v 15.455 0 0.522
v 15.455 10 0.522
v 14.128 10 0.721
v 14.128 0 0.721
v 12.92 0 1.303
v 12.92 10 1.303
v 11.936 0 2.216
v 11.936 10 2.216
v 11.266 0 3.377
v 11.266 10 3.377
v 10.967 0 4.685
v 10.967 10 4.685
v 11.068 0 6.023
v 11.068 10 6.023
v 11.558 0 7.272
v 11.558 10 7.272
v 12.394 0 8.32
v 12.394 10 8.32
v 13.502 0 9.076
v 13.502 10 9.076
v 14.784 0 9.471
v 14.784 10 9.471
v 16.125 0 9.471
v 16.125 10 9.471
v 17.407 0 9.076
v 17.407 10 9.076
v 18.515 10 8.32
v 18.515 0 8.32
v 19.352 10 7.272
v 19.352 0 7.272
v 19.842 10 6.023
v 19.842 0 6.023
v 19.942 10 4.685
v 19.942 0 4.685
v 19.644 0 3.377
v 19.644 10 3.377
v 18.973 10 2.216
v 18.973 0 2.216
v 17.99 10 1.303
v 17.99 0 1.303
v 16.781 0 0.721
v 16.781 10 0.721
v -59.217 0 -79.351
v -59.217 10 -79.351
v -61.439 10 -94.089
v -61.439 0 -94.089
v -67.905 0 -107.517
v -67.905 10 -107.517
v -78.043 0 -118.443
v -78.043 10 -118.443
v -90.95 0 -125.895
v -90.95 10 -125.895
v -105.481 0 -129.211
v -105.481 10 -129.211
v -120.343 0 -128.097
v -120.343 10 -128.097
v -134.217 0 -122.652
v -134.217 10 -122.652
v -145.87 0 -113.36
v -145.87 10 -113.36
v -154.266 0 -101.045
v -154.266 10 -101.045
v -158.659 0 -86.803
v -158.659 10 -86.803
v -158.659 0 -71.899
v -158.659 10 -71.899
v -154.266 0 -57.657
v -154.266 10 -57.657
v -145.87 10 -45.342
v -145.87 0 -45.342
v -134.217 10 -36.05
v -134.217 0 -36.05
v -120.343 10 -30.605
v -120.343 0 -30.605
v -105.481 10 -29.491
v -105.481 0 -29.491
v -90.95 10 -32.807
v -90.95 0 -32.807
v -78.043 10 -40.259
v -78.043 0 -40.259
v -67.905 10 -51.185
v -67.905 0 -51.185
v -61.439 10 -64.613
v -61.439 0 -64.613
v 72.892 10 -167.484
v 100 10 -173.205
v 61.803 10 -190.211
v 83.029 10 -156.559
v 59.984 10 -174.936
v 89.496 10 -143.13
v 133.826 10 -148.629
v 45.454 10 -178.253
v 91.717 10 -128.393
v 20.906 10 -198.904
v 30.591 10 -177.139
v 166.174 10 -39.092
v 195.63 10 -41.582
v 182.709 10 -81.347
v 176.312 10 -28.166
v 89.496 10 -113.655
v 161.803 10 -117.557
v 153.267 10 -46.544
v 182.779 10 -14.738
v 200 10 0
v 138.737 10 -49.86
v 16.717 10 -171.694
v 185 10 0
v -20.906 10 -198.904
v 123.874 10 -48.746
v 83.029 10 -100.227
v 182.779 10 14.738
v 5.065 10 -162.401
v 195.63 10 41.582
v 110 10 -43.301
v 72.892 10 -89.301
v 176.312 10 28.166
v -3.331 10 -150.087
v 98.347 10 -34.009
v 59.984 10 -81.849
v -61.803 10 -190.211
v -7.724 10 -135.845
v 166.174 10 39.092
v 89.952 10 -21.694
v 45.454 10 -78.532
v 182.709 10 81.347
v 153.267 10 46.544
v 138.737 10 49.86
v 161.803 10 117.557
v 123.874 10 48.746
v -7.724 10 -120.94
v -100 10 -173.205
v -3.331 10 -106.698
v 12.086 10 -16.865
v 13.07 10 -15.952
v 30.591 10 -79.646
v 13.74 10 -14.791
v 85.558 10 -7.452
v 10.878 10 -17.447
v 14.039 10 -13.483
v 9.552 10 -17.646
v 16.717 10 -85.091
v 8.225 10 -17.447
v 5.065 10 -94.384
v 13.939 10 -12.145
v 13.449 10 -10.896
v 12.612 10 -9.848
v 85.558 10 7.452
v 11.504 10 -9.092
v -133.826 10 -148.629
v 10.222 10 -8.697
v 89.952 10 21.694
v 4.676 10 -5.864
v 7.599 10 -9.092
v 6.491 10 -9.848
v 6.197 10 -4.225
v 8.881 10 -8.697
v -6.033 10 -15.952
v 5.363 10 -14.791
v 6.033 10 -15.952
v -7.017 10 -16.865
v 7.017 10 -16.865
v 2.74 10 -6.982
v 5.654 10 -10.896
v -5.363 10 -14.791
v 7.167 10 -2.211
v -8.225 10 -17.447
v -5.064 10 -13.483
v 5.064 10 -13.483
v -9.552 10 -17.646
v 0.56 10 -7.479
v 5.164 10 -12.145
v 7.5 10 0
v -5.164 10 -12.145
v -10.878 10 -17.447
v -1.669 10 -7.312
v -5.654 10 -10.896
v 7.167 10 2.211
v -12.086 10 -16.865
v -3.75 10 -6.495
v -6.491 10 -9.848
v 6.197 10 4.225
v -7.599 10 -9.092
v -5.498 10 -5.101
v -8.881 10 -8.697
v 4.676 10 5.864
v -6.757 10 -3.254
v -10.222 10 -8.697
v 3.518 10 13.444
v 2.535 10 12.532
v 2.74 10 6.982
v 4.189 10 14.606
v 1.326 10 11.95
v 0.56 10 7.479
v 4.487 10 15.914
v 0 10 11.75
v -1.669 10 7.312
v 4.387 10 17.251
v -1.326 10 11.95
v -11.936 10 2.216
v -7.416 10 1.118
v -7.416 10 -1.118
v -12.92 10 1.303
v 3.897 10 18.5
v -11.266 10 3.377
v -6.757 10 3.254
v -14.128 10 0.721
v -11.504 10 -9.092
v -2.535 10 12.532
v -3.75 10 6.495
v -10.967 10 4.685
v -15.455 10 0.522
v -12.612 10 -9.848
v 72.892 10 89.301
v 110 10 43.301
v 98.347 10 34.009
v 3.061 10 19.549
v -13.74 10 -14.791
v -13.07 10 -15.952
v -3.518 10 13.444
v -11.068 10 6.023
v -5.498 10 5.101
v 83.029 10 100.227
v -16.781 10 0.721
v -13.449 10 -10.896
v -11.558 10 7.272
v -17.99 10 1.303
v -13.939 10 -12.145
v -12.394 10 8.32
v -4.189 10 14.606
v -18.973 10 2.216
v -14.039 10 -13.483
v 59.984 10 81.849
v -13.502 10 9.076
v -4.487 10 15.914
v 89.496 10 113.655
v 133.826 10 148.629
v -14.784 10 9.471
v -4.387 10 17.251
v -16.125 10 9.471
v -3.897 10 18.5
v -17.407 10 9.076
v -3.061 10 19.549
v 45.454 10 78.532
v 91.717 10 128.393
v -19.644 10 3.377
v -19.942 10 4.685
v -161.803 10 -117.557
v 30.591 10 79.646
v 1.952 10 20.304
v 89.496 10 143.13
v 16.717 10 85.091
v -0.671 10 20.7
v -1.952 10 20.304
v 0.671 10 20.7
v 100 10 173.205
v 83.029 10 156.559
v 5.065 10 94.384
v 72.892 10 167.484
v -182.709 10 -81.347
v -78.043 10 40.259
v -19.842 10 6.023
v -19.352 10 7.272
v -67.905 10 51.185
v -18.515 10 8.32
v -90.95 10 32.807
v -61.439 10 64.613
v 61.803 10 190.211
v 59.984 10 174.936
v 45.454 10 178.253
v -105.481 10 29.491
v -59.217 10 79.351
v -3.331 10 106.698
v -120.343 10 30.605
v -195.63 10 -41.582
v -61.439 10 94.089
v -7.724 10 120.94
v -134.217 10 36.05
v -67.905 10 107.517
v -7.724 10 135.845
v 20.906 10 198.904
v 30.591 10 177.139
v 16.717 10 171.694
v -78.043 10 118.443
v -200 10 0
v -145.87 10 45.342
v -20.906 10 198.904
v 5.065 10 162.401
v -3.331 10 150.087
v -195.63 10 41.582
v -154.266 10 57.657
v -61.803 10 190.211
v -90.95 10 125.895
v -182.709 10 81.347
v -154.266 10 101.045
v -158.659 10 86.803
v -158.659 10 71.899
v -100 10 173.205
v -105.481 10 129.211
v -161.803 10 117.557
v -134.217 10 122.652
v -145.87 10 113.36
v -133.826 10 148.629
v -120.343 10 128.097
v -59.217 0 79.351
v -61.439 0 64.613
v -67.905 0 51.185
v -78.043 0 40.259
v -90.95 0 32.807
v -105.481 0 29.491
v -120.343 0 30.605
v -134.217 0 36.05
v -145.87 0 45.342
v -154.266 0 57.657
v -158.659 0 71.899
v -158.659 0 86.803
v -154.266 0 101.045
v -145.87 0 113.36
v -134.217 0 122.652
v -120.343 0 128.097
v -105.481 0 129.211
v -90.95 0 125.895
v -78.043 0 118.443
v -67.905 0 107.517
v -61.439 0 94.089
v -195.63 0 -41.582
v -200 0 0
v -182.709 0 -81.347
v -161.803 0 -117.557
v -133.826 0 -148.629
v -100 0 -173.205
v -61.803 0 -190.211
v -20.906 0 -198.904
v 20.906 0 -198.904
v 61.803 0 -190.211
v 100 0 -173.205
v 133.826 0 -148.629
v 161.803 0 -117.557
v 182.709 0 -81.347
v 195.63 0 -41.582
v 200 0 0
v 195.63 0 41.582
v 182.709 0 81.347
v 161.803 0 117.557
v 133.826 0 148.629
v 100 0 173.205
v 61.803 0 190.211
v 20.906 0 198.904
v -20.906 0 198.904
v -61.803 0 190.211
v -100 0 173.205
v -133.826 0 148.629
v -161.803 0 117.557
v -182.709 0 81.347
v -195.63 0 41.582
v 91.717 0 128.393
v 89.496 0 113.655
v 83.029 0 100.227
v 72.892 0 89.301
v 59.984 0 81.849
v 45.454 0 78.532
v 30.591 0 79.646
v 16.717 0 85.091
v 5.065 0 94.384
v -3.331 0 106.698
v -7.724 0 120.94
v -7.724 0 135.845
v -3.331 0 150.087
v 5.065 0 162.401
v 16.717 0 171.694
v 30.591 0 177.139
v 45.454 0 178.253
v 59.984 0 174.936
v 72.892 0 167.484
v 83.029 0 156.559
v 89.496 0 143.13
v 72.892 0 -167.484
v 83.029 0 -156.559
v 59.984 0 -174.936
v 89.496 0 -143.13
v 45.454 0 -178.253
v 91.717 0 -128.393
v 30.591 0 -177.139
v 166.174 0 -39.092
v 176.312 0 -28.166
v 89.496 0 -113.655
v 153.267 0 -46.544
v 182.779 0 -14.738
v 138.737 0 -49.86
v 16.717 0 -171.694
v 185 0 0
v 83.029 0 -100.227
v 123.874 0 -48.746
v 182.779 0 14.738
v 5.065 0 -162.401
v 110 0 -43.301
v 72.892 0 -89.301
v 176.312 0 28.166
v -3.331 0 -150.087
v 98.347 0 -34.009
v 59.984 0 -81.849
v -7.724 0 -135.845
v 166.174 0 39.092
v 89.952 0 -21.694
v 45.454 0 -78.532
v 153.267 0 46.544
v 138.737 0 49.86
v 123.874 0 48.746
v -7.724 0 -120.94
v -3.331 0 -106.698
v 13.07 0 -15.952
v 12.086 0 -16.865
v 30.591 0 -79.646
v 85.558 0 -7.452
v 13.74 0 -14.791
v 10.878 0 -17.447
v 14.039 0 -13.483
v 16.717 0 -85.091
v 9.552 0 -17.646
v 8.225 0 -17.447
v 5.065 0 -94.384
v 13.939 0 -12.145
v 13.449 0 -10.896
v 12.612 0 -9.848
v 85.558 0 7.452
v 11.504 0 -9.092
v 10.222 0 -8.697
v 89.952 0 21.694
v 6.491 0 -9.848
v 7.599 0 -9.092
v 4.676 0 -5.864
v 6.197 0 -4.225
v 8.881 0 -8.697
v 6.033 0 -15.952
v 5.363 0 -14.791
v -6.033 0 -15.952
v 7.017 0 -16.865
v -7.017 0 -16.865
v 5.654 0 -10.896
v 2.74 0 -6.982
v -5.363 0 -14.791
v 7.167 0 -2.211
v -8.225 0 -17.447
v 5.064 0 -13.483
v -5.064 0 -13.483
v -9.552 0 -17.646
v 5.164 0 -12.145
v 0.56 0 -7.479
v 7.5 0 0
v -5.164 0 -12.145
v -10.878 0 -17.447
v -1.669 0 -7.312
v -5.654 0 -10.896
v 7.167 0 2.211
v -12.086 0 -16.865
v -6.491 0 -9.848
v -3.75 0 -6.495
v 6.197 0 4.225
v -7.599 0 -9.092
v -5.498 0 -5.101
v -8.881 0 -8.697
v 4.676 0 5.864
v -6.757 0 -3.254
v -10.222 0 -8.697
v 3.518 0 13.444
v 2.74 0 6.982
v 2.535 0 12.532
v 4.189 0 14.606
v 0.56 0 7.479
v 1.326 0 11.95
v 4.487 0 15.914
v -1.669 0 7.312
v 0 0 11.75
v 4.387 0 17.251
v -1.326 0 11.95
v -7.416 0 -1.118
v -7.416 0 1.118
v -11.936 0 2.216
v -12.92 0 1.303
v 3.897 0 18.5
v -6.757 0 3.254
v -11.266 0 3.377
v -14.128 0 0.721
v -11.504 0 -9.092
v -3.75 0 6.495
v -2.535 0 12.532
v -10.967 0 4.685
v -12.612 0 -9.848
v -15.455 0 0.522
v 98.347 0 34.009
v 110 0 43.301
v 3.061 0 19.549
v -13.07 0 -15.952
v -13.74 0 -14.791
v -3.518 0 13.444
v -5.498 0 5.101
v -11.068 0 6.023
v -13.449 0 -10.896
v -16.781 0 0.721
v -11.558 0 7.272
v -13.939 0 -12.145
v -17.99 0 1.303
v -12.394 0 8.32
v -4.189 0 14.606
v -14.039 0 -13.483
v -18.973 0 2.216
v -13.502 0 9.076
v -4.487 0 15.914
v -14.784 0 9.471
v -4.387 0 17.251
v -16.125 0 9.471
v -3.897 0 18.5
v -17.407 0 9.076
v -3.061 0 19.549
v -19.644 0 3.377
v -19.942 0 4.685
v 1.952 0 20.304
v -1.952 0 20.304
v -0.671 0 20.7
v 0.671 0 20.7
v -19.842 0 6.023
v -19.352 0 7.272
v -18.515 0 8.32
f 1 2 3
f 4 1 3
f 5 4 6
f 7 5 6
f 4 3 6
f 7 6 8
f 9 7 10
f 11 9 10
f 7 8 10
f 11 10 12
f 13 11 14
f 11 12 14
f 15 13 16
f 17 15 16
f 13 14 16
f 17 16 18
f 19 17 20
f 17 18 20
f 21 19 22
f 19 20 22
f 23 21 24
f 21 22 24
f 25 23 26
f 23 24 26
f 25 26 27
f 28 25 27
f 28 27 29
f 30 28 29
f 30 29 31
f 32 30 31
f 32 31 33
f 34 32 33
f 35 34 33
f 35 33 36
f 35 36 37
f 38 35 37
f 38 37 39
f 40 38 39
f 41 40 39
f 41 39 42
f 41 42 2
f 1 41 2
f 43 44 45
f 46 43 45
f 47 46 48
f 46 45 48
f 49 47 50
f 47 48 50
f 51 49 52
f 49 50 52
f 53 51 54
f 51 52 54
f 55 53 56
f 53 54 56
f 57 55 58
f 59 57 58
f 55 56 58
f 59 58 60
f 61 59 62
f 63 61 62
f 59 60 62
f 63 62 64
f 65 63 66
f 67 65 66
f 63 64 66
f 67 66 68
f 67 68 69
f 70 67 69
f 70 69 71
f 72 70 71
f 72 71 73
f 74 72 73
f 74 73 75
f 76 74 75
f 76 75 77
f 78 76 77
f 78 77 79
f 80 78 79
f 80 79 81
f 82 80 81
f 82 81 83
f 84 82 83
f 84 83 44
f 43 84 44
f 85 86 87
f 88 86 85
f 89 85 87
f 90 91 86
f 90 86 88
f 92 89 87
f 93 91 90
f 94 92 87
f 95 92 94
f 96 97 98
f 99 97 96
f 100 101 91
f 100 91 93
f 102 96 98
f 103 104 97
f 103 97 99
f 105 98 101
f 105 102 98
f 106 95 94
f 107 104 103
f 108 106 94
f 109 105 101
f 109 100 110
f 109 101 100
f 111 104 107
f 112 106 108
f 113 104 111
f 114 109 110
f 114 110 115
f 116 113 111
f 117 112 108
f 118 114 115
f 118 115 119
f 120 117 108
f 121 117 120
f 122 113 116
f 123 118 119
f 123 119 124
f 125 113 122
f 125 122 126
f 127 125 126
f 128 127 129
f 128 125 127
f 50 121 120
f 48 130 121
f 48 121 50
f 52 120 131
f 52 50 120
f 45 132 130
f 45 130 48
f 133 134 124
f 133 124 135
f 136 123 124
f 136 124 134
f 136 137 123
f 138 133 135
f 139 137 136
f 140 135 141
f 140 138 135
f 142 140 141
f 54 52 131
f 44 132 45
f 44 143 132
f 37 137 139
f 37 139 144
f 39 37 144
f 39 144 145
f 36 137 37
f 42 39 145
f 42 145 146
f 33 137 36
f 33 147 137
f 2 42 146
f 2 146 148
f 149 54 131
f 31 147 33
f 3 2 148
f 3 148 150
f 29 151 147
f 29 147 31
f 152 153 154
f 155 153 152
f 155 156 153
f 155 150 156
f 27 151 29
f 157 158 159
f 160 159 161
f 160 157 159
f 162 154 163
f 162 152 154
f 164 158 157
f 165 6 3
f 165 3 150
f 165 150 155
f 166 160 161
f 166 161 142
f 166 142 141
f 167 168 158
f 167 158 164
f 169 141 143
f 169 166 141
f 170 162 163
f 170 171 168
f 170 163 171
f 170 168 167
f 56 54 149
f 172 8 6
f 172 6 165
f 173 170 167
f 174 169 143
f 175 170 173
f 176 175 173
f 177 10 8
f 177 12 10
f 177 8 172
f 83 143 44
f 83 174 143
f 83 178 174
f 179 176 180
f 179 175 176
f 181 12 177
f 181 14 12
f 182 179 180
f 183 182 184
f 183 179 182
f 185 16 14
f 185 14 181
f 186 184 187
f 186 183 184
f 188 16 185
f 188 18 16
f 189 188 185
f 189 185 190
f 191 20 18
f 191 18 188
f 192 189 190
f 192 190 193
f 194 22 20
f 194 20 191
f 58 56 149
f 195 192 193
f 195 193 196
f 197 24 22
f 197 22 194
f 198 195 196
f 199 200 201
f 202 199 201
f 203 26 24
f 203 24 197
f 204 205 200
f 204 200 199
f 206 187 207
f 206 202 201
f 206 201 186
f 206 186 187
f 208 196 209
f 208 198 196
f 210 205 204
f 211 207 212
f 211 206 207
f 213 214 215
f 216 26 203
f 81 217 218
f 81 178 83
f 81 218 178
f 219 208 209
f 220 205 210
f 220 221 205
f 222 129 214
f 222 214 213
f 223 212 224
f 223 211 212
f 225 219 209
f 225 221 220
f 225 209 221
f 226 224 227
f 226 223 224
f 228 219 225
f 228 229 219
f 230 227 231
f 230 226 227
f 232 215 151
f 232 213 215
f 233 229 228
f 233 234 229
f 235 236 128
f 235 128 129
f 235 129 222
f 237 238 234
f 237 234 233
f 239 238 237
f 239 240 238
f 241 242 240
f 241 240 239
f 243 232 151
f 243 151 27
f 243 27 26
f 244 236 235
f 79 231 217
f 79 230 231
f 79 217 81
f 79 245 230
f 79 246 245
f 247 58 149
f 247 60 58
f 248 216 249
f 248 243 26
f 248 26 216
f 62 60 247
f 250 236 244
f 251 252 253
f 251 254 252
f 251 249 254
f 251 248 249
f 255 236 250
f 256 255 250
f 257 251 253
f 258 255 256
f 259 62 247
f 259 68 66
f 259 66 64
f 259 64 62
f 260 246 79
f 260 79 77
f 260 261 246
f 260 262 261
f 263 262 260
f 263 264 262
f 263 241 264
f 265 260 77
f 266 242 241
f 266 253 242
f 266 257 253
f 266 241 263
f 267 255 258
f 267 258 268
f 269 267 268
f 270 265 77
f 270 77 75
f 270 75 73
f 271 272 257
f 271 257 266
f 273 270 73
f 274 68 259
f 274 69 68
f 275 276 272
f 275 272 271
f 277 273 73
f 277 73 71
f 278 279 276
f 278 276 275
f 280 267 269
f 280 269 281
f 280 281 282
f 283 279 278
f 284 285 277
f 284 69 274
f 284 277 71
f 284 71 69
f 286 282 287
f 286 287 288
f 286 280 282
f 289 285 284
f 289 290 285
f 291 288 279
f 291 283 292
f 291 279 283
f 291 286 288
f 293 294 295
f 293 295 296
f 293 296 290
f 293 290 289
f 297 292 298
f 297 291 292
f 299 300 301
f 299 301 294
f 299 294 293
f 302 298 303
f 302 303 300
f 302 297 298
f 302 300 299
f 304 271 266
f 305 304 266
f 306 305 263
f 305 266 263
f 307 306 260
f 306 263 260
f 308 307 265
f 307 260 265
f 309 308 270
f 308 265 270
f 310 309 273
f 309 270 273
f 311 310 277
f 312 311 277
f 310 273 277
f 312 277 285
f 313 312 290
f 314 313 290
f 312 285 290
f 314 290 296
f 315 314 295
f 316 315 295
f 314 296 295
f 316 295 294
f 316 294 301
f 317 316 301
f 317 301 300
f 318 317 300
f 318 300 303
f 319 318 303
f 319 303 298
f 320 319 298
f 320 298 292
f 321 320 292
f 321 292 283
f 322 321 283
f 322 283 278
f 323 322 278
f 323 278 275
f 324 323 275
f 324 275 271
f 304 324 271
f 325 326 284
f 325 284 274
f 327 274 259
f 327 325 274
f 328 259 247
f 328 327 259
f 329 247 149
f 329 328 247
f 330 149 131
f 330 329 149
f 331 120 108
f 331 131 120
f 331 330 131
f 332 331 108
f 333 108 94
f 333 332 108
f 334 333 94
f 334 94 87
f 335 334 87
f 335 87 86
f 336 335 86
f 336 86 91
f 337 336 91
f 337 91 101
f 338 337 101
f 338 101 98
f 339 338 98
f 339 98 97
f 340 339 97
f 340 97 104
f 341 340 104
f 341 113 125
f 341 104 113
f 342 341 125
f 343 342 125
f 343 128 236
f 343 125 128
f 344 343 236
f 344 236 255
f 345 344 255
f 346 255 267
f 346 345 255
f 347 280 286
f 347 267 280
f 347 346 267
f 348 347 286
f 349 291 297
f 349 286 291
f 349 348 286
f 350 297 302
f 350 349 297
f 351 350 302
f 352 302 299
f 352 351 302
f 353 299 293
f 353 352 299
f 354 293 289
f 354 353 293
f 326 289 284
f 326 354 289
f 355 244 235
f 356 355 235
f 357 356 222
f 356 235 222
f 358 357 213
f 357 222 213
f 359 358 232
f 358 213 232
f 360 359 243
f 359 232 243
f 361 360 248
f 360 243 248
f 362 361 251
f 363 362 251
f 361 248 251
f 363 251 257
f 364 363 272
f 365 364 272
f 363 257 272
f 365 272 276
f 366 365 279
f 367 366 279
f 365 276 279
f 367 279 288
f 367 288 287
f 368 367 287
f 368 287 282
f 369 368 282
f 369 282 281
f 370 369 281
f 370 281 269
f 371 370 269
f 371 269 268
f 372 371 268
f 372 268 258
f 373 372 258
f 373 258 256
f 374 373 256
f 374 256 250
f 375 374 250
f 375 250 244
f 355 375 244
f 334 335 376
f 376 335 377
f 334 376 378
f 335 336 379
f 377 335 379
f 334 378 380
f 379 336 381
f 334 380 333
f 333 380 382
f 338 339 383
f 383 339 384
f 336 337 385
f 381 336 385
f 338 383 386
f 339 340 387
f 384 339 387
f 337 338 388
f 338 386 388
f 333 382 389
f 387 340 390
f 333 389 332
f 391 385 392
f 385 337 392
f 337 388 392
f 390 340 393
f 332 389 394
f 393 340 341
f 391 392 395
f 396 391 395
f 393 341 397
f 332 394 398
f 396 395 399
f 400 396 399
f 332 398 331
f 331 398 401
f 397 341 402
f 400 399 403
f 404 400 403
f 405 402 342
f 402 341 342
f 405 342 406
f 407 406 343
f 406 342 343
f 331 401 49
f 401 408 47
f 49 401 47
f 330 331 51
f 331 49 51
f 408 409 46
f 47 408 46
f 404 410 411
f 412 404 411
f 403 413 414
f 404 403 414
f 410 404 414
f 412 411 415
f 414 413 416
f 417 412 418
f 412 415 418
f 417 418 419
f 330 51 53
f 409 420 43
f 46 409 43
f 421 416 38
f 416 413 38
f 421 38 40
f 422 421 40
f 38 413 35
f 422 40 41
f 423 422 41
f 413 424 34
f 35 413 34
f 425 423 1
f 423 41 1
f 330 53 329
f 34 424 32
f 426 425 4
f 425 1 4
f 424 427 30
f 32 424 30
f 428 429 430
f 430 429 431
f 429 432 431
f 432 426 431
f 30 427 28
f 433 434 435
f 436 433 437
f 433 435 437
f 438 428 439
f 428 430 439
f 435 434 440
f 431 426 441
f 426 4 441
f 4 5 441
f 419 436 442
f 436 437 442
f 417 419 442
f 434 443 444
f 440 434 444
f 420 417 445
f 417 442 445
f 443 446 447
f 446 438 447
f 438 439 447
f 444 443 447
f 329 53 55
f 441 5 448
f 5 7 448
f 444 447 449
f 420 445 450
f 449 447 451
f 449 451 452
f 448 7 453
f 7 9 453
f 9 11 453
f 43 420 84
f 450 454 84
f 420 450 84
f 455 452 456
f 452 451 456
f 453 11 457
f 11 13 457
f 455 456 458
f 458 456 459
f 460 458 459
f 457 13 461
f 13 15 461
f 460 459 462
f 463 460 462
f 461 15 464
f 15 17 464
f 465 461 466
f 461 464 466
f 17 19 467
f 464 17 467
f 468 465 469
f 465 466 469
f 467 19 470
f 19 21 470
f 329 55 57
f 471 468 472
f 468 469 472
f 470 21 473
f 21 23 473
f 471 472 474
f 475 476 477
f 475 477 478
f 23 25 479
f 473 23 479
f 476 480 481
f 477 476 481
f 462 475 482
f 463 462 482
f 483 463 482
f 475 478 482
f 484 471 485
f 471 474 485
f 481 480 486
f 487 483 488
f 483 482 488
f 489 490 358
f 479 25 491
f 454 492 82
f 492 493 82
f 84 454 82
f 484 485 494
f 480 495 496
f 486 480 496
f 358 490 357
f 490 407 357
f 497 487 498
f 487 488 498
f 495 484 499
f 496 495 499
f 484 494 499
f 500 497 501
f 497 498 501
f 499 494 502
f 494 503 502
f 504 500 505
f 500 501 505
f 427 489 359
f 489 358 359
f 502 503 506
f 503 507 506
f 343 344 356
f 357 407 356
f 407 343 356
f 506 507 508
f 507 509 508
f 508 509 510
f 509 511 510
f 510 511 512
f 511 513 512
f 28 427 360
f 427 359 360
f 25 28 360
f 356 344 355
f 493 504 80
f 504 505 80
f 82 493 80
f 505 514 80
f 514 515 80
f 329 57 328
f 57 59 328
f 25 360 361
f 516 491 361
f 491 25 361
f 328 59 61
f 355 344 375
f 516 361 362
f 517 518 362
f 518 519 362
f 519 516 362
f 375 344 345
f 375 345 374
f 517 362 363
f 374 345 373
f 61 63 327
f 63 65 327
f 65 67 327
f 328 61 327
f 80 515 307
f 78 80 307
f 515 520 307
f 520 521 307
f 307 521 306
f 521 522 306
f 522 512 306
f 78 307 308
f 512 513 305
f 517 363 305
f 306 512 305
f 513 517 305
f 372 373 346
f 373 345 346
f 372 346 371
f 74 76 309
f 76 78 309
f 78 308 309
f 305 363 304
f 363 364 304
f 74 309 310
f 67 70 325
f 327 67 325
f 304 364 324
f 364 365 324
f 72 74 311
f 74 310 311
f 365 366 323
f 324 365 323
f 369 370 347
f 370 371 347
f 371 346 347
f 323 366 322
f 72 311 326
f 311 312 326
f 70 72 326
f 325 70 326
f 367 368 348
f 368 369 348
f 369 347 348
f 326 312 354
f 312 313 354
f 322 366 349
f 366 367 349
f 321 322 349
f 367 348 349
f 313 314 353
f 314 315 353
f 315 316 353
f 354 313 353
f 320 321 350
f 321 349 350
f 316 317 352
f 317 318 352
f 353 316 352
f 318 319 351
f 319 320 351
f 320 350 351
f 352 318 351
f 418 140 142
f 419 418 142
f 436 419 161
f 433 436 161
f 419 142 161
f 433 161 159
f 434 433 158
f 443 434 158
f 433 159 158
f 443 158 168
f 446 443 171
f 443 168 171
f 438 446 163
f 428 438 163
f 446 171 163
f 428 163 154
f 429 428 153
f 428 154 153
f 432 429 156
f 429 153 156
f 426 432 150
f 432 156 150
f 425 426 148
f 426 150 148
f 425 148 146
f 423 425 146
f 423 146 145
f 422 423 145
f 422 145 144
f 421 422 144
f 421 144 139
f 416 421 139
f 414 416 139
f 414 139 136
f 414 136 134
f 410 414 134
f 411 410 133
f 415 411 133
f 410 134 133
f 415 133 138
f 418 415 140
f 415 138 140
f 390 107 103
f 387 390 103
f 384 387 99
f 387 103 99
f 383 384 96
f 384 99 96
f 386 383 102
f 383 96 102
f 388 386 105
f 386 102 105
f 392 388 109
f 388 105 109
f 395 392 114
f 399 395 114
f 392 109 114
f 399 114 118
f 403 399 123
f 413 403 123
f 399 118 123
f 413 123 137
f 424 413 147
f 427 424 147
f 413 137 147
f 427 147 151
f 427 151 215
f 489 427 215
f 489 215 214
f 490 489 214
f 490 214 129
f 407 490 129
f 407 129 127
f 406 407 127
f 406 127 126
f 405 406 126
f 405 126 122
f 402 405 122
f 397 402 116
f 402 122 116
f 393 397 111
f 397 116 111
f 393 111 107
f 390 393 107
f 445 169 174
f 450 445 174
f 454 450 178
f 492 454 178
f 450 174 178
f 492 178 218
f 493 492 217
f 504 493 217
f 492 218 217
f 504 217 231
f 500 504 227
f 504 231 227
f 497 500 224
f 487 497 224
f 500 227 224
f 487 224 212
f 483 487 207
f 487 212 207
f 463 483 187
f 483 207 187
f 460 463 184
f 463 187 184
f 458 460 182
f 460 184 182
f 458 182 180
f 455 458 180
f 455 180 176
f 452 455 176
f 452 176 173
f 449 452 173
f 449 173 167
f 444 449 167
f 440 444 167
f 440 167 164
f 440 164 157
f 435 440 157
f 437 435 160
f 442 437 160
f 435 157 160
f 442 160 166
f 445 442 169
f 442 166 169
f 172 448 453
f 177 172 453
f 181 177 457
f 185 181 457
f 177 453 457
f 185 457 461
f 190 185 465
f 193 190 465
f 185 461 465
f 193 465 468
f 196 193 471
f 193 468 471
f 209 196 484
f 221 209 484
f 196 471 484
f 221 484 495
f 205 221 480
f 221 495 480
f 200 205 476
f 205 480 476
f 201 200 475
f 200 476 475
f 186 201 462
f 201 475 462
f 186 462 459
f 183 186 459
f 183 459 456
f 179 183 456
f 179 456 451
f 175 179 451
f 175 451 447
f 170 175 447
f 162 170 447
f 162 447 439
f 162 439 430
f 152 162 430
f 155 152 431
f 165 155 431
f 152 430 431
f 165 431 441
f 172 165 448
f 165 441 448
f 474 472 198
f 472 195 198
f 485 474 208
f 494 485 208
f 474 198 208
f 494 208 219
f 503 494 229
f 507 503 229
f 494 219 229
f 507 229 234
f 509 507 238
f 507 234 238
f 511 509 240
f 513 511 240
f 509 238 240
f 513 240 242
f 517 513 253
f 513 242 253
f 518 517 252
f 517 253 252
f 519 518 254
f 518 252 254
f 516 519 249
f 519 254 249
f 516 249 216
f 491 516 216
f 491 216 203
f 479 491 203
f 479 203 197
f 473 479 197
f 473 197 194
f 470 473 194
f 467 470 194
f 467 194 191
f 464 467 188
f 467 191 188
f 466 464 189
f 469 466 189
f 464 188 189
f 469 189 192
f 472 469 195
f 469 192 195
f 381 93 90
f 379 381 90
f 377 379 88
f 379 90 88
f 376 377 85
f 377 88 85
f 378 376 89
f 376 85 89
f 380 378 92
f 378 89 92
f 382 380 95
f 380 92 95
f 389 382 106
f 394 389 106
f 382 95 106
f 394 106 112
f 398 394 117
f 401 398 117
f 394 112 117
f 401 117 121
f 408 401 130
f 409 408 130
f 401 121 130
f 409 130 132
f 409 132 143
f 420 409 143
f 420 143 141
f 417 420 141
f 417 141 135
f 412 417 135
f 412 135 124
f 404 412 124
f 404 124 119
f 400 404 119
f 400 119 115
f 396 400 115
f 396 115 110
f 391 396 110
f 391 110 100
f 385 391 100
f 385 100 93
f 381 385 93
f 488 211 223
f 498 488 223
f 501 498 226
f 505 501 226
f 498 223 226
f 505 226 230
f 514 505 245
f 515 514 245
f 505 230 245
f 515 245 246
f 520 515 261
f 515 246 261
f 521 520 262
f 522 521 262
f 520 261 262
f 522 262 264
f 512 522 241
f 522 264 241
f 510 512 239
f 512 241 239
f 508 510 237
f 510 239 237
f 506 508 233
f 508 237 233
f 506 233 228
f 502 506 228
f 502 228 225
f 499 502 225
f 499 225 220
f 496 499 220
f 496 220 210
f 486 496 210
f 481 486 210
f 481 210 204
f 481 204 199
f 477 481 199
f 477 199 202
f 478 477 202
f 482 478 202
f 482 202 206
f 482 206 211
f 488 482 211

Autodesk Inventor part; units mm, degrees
ref_plane "YZ Plane" through (0, 0, 0) normal (1, 0, 0) x (0, 1, 0)
ref_plane "XZ Plane" through (0, 0, 0) normal (0, 1, 0) x (-1, 0, 0)
ref_plane "XY Plane" through (0, 0, 0) normal (0, 0, 1) x (1, 0, 0)
sketch "Skizze1" plane through (0, 0, 0) normal (0, 1, 0) x (-1, 0, 0)
  circle A0 centre (0, 0) radius 200
  dimension "d0" = 400
extrude "Extrusion1" add sketch "Skizze1" along normal blind 10
sketch "Skizze2" plane through (0, 10, 0) normal (0, 1, 0) x (1, 0, 0)
  circle A0 centre (0, 0) radius 200 projected
  line L0 (0, 0) -> (200, 0) construction
  line L1 (0, 0) -> (61.8034, 190.2113)
  line L2 (0, 0) -> (200, 0) construction
  line L3 (0, 0) -> (-161.8034, 117.5571)
  line L4 (0, 0) -> (200, 0) construction
  line L5 (0, 0) -> (61.8034, -190.2113)
  line L6 (0, 0) -> (-161.8034, -117.5571)
  line L7 (0, 0) -> (200, 0)
  line L8 (200, 0) -> (100, 0)
  line L9 (0, 0) -> (30.9017, -95.1057)
  line L10 (200, 0) -> (135, 0)
  circle A1 centre (135, 0) radius 50
  line L11 (61.8034, -190.2113) -> (41.7173, -128.3926)
  circle A2 centre (41.7173, -128.3926) radius 50
  line L12 (-161.8034, -117.5571) -> (-109.2173, -79.351)
  circle A3 centre (-109.2173, -79.351) radius 50
  line L13 (-161.8034, 117.5571) -> (-109.2173, 79.351)
  circle A4 centre (-109.2173, 79.351) radius 50
  line L14 (61.8034, 190.2113) -> (41.7173, 128.3926)
  circle A5 centre (41.7173, 128.3926) radius 50
  dimension "d4" = 72
  dimension "d5" = 144
  dimension "d9" = 65
  dimension "d10" = 100
  dimension "d11" = 65
  dimension "d12" = 100
  dimension "d13" = 65
  dimension "d14" = 100
  dimension "d15" = 65
  dimension "d16" = 100
  dimension "d17" = 65
  dimension "d18" = 100
extrude "Extrusion4" cut sketch "Skizze2" against normal blind 10 contours A1 L7 | L7 A1 | A5 L1 | L1 A5 | A2 L5 | L5 A2 | A4 L3 | L3 A4 | A3 L6 | L6 A3
sketch "Skizze5" plane through (0, 0, 0) normal (0, -1, 0) x (1, 0, 0)
  circle A0 centre (0, 0) radius 7.5
  dimension "d27" = 15
extrude "Extrusion5" cut sketch "Skizze5" against normal blind 10
sketch "Skizze6" plane through (0, 0, 0) normal (0, -1, 0) x (1, 0, 0)
  line L0 (0, 0) -> (0, 16.25)
  line L1 (0, 0) -> (15.4547, 5.0215)
  line L2 (0, 0) -> (16.25, 0) construction
  line L3 (0, 0) -> (16.25, 0) construction
  line L4 (0, 0) -> (9.5515, -13.1465)
  line L5 (0, 0) -> (16.25, 0) construction
  line L6 (0, 0) -> (-9.5515, -13.1465)
  line L7 (0, 0) -> (16.25, 0) construction
  line L8 (0, 0) -> (-15.4547, 5.0215)
  dimension "d30" = 16.25
  dimension "d31" = 16.25
  dimension "d32" = 18
  dimension "d35" = 16.25
  dimension "d36" = 54
  dimension "d37" = 16.25
  dimension "d40" = 16.25
hole "Bohrung1" at (0, 0, 16.25) at (-15.4547, 0, 5.0215) at (-9.5515, 0, -13.1465) at (15.4547, 0, 5.0215) at (9.5515, 0, -13.1465) direction (0, 1, 0) diameter 9 depth 10 tip angle 118
properties part number "Drehplatte_Rahmenvorrrichtung" material "Holz (Birke)"
